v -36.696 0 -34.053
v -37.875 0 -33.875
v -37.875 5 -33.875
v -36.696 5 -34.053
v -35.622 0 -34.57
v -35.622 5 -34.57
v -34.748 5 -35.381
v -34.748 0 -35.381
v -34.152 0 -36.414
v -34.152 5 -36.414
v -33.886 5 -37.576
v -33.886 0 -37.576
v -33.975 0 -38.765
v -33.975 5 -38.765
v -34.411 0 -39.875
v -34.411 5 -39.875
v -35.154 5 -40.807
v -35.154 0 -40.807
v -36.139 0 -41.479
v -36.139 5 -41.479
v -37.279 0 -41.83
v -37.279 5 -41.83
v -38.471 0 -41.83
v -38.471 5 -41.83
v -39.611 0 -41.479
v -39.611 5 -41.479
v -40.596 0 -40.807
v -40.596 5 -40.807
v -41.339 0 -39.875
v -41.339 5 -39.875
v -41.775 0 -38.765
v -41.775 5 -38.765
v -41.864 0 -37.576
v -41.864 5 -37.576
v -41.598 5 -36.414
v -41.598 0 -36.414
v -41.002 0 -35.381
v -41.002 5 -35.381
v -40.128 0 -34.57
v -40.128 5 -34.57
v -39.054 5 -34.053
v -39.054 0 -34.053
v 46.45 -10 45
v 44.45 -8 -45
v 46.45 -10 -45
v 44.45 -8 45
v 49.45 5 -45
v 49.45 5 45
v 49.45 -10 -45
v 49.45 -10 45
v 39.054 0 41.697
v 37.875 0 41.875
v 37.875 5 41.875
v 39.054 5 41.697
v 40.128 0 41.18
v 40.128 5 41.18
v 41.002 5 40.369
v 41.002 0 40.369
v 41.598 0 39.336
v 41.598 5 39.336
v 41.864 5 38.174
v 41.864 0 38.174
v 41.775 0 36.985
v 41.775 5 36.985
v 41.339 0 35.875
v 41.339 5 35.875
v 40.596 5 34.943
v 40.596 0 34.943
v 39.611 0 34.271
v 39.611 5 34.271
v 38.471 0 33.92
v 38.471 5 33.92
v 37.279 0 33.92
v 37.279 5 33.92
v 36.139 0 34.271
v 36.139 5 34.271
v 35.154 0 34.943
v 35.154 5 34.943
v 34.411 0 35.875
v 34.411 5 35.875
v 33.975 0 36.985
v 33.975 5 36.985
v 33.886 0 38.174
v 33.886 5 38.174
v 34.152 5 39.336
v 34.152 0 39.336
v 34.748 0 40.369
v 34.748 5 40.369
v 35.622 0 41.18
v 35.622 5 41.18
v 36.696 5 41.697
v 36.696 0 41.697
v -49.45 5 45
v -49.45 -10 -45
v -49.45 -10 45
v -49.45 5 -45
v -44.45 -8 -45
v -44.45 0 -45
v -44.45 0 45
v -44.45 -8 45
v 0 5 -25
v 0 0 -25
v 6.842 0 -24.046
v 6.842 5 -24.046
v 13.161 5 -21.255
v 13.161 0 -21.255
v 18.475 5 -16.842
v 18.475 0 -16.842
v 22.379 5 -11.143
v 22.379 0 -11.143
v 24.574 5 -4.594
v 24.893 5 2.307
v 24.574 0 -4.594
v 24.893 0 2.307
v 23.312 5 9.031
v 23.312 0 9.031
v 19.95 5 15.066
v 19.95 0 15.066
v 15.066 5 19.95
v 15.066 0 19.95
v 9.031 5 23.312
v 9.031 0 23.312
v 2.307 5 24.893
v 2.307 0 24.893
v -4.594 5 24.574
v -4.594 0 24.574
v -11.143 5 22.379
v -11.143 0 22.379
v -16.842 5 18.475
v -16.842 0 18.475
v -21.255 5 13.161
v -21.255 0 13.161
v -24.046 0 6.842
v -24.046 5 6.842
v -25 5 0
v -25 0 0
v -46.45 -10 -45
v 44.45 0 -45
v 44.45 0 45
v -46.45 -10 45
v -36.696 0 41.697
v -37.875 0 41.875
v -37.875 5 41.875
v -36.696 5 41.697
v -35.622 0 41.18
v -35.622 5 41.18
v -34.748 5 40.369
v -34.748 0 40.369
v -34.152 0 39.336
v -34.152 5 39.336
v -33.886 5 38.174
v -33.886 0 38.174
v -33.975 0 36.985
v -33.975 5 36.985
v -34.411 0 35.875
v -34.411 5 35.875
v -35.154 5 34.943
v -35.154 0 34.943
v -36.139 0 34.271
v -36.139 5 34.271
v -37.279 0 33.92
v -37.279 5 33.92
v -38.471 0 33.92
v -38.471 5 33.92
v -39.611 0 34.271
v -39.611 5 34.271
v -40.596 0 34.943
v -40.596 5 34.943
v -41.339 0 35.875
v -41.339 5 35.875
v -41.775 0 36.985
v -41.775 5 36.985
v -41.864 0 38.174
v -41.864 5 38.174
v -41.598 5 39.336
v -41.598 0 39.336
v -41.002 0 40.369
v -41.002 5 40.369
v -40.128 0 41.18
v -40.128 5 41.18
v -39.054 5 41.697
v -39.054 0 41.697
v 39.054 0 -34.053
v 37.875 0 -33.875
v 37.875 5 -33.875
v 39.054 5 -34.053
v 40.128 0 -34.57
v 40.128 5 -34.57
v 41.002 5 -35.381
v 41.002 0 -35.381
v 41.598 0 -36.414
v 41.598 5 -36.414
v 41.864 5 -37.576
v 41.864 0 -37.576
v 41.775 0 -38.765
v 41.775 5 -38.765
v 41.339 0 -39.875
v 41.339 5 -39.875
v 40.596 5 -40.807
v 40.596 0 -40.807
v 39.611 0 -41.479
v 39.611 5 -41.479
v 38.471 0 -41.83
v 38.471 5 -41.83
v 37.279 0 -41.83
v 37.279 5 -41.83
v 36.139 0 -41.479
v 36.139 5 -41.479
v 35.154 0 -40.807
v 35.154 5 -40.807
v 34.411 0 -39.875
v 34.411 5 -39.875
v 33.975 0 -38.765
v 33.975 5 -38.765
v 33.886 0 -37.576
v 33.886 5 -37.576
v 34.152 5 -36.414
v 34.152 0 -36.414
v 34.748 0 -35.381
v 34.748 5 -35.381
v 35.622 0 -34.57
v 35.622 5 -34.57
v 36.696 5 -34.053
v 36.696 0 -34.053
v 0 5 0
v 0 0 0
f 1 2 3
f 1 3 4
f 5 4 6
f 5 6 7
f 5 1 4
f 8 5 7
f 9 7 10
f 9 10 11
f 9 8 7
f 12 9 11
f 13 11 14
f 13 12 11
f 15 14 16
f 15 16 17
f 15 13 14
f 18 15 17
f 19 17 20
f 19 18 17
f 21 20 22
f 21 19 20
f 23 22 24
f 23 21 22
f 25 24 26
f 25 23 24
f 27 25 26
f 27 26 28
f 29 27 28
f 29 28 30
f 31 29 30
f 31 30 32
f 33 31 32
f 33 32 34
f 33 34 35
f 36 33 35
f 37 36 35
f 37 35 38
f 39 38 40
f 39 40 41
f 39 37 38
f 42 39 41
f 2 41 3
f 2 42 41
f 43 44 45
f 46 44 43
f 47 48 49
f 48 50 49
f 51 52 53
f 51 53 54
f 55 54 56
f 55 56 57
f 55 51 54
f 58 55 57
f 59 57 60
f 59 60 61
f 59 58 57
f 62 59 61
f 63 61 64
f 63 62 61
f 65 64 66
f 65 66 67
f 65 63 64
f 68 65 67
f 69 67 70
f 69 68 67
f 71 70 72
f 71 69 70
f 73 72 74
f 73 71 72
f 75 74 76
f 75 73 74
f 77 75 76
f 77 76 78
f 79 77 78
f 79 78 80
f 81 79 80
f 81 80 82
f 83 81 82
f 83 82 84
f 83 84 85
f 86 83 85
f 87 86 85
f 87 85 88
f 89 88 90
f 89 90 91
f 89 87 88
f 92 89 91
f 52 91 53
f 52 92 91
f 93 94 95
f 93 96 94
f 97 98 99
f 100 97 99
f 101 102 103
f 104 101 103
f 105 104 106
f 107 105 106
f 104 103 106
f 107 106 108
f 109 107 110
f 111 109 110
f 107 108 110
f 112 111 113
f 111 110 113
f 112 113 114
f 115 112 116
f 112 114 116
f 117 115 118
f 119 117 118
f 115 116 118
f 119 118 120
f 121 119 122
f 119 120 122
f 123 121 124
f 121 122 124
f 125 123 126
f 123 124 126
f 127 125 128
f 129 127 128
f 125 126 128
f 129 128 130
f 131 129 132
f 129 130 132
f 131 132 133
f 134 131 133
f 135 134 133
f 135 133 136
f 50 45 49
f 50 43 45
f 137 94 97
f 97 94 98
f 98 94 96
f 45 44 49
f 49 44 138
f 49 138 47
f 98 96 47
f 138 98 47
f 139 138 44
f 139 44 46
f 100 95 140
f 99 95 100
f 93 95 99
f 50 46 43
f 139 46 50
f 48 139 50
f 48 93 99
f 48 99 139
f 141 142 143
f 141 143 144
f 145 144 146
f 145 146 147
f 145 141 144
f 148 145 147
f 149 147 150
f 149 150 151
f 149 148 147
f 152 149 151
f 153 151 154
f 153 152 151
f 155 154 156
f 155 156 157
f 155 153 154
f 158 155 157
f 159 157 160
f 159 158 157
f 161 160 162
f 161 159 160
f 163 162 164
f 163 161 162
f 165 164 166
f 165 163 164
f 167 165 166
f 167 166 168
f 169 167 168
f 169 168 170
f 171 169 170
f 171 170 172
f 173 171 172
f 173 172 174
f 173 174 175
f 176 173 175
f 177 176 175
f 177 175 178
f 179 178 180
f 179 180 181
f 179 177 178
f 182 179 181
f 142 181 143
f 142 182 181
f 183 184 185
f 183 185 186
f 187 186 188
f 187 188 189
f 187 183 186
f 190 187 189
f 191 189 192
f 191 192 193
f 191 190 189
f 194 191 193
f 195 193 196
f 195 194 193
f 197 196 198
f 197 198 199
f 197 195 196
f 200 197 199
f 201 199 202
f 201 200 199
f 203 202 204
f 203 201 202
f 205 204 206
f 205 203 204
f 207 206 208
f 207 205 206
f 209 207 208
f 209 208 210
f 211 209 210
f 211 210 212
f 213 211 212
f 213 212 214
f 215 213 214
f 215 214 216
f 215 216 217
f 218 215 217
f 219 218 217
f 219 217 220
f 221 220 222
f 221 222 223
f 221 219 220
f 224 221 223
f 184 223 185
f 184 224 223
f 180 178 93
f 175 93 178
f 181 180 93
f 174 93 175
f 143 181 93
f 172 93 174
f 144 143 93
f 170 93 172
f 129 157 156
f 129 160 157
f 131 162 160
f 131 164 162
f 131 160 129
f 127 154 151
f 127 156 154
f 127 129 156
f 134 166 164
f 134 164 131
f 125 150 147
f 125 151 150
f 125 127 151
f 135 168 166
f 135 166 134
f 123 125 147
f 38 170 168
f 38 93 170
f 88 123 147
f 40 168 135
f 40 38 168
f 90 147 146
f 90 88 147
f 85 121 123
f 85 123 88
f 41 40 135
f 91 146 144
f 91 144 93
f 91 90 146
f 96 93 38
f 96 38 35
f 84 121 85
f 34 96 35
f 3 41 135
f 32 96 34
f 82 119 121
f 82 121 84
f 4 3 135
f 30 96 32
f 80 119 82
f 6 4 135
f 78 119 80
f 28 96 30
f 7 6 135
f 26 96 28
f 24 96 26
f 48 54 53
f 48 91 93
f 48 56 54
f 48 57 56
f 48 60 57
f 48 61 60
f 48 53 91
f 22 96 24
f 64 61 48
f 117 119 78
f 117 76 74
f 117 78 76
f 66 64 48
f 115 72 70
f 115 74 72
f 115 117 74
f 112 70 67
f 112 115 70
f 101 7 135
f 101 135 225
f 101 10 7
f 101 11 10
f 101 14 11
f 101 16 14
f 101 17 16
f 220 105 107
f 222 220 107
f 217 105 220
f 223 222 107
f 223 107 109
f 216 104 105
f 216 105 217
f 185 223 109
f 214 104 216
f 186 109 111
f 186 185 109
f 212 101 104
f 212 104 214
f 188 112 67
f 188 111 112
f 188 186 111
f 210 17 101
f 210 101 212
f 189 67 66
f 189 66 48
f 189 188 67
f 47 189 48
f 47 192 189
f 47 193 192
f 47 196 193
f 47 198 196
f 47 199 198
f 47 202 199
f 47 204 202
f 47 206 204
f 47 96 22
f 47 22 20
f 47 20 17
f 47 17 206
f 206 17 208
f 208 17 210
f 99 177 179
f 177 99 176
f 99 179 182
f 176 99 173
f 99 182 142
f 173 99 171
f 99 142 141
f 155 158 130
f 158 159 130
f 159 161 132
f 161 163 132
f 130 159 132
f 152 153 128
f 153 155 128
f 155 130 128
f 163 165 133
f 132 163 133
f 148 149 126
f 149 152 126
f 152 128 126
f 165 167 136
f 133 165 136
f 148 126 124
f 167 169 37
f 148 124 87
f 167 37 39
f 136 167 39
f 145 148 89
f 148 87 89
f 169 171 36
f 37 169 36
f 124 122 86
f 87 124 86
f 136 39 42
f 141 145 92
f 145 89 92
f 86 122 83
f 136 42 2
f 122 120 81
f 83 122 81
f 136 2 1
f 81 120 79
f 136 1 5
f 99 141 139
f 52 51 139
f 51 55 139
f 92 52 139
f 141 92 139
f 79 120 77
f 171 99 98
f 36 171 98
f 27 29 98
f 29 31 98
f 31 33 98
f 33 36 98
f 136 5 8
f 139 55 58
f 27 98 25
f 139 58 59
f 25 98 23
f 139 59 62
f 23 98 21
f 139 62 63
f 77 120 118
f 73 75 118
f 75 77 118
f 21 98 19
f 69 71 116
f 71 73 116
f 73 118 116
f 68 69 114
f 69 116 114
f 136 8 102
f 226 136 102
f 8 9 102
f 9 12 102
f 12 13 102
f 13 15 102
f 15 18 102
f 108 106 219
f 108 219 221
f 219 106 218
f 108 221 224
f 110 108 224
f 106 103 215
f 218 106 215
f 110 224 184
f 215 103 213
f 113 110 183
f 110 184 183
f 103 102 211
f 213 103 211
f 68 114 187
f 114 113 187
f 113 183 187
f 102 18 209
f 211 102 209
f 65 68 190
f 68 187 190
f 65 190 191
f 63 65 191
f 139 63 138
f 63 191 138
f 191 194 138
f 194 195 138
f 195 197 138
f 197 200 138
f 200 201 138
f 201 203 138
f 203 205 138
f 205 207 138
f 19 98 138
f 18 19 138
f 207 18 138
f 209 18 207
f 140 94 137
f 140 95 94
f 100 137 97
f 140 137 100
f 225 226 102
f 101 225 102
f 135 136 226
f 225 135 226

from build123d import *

# Parameters (mm, degrees)
SKETCH1_W           = 98.9
SKETCH1_H           = 90
SKETCH1_R           = 4
BOSS_EXTRUDE1_DEPTH = 5
SKETCH2_W           = 5
SKETCH2_H           = 90
BOSS_EXTRUDE2_DEPTH = 10
CHAMFER1_SIZE       = 2


with BuildPart() as part:
    # Sketch1 → Boss-Extrude1 (new body)
    with BuildSketch(Plane(origin=(0, 0, 0), x_dir=(1, 0, 0), z_dir=(0, 1, 0))):
        Rectangle(SKETCH1_W, SKETCH1_H)
        with Locations(Location((-37.875, -37.875, 0), (0, 0, 270))):
            Circle(SKETCH1_R, mode=Mode.SUBTRACT)
        with Locations(Location((37.875, -37.875, 0), (0, 0, 270))):
            Circle(SKETCH1_R, mode=Mode.SUBTRACT)
        with Locations(Location((-37.875, 37.875, 0), (0, 0, 270))):
            Circle(SKETCH1_R, mode=Mode.SUBTRACT)
        with BuildLine():
            Line((-25, 0), (0, 0))
            Line((0, 0), (0, 25))
            ThreePointArc((0, 25), (17.67766953, -17.67766953), (-25, 0))
        make_face(mode=Mode.SUBTRACT)
        with Locations(Location((37.875, 37.875, 0), (0, 0, 270))):
            Circle(SKETCH1_R, mode=Mode.SUBTRACT)
    extrude(amount=BOSS_EXTRUDE1_DEPTH)

    # Sketch2 → Boss-Extrude2 (add)
    with BuildSketch(Plane.XZ):
        with Locations((-46.95, 0)):
            Rectangle(SKETCH2_W, SKETCH2_H)
        with Locations((46.95, 0)):
            Rectangle(SKETCH2_W, SKETCH2_H)
    extrude(amount=BOSS_EXTRUDE2_DEPTH)

    # Chamfer1
    chamfer1_edges = [part.edges().sort_by_distance(p)[0] for p in [
        (-44.45, -10, 0),
        (44.45, -10, 0),
    ]]
    chamfer(chamfer1_edges, length=CHAMFER1_SIZE)


solid = part.part
